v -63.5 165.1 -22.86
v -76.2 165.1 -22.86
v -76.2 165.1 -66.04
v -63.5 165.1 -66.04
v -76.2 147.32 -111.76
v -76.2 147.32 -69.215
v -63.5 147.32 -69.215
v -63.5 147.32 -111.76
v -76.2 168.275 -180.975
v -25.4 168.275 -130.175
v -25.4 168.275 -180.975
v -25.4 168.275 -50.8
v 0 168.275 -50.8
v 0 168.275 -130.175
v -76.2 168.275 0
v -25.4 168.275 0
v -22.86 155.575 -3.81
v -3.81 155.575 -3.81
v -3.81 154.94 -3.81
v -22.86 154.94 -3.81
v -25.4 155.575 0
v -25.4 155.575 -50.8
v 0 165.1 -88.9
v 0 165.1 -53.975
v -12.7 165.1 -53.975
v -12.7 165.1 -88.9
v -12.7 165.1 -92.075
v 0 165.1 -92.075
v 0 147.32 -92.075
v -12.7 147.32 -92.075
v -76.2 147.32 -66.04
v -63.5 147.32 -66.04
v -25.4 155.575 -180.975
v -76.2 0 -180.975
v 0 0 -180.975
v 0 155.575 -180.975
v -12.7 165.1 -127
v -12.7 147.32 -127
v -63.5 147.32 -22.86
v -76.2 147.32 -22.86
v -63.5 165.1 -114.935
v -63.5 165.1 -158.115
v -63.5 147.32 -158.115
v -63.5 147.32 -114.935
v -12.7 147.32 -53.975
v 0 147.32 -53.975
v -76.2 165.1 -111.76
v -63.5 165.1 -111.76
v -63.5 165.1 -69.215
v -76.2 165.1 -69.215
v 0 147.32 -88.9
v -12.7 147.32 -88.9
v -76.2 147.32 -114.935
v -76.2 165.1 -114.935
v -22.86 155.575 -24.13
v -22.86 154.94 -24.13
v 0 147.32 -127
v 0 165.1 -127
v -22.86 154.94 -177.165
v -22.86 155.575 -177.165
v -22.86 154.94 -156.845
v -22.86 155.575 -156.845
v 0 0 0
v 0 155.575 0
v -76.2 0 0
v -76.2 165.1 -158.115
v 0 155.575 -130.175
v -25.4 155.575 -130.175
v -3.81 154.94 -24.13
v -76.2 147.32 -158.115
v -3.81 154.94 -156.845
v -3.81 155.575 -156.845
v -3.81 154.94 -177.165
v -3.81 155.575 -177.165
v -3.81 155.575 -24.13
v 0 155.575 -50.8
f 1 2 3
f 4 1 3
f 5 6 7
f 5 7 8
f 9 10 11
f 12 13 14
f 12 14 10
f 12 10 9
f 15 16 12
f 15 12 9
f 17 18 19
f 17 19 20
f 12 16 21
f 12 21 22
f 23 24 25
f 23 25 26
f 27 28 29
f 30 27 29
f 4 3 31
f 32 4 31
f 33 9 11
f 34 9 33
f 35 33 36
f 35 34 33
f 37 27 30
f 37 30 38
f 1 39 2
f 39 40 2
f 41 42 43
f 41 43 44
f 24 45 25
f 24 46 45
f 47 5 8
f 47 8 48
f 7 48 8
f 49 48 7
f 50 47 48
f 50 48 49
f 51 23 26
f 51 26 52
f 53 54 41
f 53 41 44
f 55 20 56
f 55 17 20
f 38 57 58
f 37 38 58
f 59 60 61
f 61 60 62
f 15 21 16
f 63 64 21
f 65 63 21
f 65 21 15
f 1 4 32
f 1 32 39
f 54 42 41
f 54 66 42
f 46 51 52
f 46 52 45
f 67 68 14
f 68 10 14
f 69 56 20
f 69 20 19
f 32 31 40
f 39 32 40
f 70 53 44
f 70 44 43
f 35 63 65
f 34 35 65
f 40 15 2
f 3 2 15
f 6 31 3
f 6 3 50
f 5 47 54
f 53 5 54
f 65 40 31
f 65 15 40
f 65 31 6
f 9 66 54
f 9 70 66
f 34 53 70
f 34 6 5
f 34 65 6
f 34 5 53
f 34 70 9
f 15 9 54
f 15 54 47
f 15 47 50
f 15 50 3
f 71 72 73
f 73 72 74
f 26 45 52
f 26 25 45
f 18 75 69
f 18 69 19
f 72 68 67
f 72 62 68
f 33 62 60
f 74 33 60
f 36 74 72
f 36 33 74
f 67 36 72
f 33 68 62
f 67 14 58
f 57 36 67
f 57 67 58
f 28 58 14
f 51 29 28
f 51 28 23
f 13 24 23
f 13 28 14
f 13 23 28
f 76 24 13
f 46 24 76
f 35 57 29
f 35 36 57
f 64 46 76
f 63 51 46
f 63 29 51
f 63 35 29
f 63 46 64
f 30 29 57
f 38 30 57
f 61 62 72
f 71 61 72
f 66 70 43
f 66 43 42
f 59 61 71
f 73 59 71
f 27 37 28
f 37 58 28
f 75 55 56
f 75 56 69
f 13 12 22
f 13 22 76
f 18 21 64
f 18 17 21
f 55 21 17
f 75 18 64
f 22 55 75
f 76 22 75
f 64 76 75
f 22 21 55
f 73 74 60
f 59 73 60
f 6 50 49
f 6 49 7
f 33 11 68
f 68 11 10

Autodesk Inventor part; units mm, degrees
ref_plane "YZ Plane" through (0, 0, 0) normal (1, 0, 0) x (0, 1, 0)
ref_plane "XZ Plane" through (0, 0, 0) normal (0, 1, 0) x (-1, 0, 0)
ref_plane "XY Plane" through (0, 0, 0) normal (0, 0, 1) x (1, 0, 0)
sketch "Sketch1" plane through (0, 0, 0) normal (0, 1, 0) x (-1, 0, 0)
  line L0 (0, 0) -> (76.2, 0)
  line L1 (76.2, 0) -> (76.2, -180.975)
  line L2 (76.2, -180.975) -> (0, -180.975)
  line L3 (0, -180.975) -> (0, 0)
  dimension "d0" = 76.2
  dimension "d1" = 180.975
extrude "Extrusion1" add sketch "Sketch1" along normal blind 168.275
sketch "Sketch2" plane through (0, 168.275, 0) normal (0, 1, 0) x (1, 0, 0)
  line L0 (-76.2, 0) -> (0, 0) construction
  line L1 (0, 0) -> (0, 180.975) construction
  line L2 (0, 180.975) -> (-76.2, 180.975) construction
  line L3 (-76.2, 180.975) -> (-76.2, 0) construction
  line L4 (0, 0) -> (0, 180.975) projected
  line L5 (0, 0) -> (-25.4, 0)
  line L6 (-25.4, 0) -> (-25.4, 50.8)
  line L7 (-25.4, 50.8) -> (0, 50.8)
  line L8 (0, 50.8) -> (0, 0)
  line L9 (0, 180.975) -> (-25.4, 180.975)
  line L10 (-25.4, 180.975) -> (-25.4, 130.175)
  line L11 (-25.4, 130.175) -> (0, 130.175)
  line L12 (0, 130.175) -> (0, 180.975)
  dimension "d4" = 25.4
  dimension "d5" = 50.8
  dimension "d6" = 25.4
  dimension "d7" = 50.8
extrude "Extrusion2" cut sketch "Sketch2" against normal blind 12.7
sketch "Sketch3" plane through (0, 0, 0) normal (1, 0, 0) x (0, 0, -1)
  line L0 (50.8, 168.275) -> (130.175, 168.275) construction
  line L1 (130.175, 155.575) -> (130.175, 168.275) construction
  line L2 (50.8, 168.275) -> (50.8, 155.575) construction
  line L3 (127, 155.575) -> (127, 165.1) construction
  line L4 (127, 165.1) -> (53.975, 165.1) construction
  line L5 (53.975, 165.1) -> (53.975, 155.575) construction
  line L6 (53.975, 165.1) -> (88.9, 165.1)
  line L7 (88.9, 165.1) -> (88.9, 147.32)
  line L8 (88.9, 147.32) -> (53.975, 147.32)
  line L9 (53.975, 147.32) -> (53.975, 165.1)
  line L10 (127, 165.1) -> (92.075, 165.1)
  line L11 (92.075, 165.1) -> (92.075, 147.32)
  line L12 (92.075, 147.32) -> (127, 147.32)
  line L13 (127, 147.32) -> (127, 165.1)
  point P0 (0, 0)
  dimension "d10" = 3.175
  dimension "d11" = 34.925
  dimension "d12" = 17.78
  dimension "d13" = 34.925
  dimension "d14" = 17.78
  dimension "d15" = 3.175
extrude "Extrusion3" cut sketch "Sketch3" against normal blind 12.7
sketch "Sketch4" plane through (0, 155.575, 0) normal (0, 1, 0) x (1, 0, 0)
  line L0 (0, 0) -> (-25.4, 0) construction
  line L1 (0, 50.8) -> (0, 0) construction
  line L2 (0, 180.975) -> (0, 130.175) construction
  line L3 (-25.4, 180.975) -> (0, 180.975) construction
  line L4 (-3.81, 50.8) -> (-3.81, 3.81) construction
  line L5 (-3.81, 3.81) -> (-25.4, 3.81) construction
  line L6 (-3.81, 130.175) -> (-3.81, 177.165) construction
  line L7 (-3.81, 177.165) -> (-25.4, 177.165) construction
  line L8 (-3.81, 3.81) -> (-22.86, 3.81)
  line L9 (-22.86, 3.81) -> (-22.86, 24.13)
  line L10 (-22.86, 24.13) -> (-3.81, 24.13)
  line L11 (-3.81, 24.13) -> (-3.81, 3.81)
  line L12 (-3.81, 177.165) -> (-22.86, 177.165)
  line L13 (-22.86, 177.165) -> (-22.86, 156.845)
  line L14 (-22.86, 156.845) -> (-3.81, 156.845)
  line L15 (-3.81, 156.845) -> (-3.81, 177.165)
  dimension "d18" = 3.81
  dimension "d19" = 3.81
  dimension "d20" = 19.05
  dimension "d21" = 20.32
  dimension "d22" = 19.05
  dimension "d23" = 20.32
extrude "Extrusion4" cut sketch "Sketch4" against normal blind 0.635
sketch "Sketch5" plane through (-76.2, 0, -180.975) normal (-1, 0, 0) x (0, 0, 1)
  line L0 (0, 168.275) -> (180.975, 168.275) construction
  line L1 (2.549, 165.1) -> (183.524, 165.1) construction
  line L2 (0, 0) -> (0, 168.275) construction
  line L3 (180.975, 0) -> (180.975, 168.275) construction
  line L4 (22.86, 2.1972) -> (22.86, 168.275) construction
  line L5 (158.115, 168.275) -> (158.115, 0) construction
  line L6 (22.86, 165.1) -> (66.04, 165.1)
  line L7 (66.04, 165.1) -> (66.04, 147.32)
  line L8 (66.04, 147.32) -> (22.86, 147.32)
  line L9 (22.86, 147.32) -> (22.86, 165.1)
  line L10 (158.115, 165.1) -> (114.935, 165.1)
  line L11 (114.935, 165.1) -> (114.935, 147.32)
  line L12 (114.935, 147.32) -> (158.115, 147.32)
  line L13 (158.115, 147.32) -> (158.115, 165.1)
  line L14 (66.04, 165.1) -> (69.215, 165.1) construction
  line L15 (114.935, 165.1) -> (111.76, 165.1) construction
  line L16 (69.215, 165.1) -> (111.76, 165.1)
  line L17 (111.76, 165.1) -> (111.76, 147.32)
  line L18 (111.76, 147.32) -> (69.215, 147.32)
  line L19 (69.215, 147.32) -> (69.215, 165.1)
  dimension "d26" = 3.175
  dimension "d27" = 22.86
  dimension "d28" = 22.86
  dimension "d29" = 43.18
  dimension "d30" = 43.18
  dimension "d31" = 17.78
  dimension "d32" = 3.175
  dimension "d33" = 3.175
  dimension "d34" = 42.545
  dimension "d35" = 17.78
extrude "Extrusion5" cut sketch "Sketch5" against normal blind 12.7
properties part number "Battery-1111-2017"
